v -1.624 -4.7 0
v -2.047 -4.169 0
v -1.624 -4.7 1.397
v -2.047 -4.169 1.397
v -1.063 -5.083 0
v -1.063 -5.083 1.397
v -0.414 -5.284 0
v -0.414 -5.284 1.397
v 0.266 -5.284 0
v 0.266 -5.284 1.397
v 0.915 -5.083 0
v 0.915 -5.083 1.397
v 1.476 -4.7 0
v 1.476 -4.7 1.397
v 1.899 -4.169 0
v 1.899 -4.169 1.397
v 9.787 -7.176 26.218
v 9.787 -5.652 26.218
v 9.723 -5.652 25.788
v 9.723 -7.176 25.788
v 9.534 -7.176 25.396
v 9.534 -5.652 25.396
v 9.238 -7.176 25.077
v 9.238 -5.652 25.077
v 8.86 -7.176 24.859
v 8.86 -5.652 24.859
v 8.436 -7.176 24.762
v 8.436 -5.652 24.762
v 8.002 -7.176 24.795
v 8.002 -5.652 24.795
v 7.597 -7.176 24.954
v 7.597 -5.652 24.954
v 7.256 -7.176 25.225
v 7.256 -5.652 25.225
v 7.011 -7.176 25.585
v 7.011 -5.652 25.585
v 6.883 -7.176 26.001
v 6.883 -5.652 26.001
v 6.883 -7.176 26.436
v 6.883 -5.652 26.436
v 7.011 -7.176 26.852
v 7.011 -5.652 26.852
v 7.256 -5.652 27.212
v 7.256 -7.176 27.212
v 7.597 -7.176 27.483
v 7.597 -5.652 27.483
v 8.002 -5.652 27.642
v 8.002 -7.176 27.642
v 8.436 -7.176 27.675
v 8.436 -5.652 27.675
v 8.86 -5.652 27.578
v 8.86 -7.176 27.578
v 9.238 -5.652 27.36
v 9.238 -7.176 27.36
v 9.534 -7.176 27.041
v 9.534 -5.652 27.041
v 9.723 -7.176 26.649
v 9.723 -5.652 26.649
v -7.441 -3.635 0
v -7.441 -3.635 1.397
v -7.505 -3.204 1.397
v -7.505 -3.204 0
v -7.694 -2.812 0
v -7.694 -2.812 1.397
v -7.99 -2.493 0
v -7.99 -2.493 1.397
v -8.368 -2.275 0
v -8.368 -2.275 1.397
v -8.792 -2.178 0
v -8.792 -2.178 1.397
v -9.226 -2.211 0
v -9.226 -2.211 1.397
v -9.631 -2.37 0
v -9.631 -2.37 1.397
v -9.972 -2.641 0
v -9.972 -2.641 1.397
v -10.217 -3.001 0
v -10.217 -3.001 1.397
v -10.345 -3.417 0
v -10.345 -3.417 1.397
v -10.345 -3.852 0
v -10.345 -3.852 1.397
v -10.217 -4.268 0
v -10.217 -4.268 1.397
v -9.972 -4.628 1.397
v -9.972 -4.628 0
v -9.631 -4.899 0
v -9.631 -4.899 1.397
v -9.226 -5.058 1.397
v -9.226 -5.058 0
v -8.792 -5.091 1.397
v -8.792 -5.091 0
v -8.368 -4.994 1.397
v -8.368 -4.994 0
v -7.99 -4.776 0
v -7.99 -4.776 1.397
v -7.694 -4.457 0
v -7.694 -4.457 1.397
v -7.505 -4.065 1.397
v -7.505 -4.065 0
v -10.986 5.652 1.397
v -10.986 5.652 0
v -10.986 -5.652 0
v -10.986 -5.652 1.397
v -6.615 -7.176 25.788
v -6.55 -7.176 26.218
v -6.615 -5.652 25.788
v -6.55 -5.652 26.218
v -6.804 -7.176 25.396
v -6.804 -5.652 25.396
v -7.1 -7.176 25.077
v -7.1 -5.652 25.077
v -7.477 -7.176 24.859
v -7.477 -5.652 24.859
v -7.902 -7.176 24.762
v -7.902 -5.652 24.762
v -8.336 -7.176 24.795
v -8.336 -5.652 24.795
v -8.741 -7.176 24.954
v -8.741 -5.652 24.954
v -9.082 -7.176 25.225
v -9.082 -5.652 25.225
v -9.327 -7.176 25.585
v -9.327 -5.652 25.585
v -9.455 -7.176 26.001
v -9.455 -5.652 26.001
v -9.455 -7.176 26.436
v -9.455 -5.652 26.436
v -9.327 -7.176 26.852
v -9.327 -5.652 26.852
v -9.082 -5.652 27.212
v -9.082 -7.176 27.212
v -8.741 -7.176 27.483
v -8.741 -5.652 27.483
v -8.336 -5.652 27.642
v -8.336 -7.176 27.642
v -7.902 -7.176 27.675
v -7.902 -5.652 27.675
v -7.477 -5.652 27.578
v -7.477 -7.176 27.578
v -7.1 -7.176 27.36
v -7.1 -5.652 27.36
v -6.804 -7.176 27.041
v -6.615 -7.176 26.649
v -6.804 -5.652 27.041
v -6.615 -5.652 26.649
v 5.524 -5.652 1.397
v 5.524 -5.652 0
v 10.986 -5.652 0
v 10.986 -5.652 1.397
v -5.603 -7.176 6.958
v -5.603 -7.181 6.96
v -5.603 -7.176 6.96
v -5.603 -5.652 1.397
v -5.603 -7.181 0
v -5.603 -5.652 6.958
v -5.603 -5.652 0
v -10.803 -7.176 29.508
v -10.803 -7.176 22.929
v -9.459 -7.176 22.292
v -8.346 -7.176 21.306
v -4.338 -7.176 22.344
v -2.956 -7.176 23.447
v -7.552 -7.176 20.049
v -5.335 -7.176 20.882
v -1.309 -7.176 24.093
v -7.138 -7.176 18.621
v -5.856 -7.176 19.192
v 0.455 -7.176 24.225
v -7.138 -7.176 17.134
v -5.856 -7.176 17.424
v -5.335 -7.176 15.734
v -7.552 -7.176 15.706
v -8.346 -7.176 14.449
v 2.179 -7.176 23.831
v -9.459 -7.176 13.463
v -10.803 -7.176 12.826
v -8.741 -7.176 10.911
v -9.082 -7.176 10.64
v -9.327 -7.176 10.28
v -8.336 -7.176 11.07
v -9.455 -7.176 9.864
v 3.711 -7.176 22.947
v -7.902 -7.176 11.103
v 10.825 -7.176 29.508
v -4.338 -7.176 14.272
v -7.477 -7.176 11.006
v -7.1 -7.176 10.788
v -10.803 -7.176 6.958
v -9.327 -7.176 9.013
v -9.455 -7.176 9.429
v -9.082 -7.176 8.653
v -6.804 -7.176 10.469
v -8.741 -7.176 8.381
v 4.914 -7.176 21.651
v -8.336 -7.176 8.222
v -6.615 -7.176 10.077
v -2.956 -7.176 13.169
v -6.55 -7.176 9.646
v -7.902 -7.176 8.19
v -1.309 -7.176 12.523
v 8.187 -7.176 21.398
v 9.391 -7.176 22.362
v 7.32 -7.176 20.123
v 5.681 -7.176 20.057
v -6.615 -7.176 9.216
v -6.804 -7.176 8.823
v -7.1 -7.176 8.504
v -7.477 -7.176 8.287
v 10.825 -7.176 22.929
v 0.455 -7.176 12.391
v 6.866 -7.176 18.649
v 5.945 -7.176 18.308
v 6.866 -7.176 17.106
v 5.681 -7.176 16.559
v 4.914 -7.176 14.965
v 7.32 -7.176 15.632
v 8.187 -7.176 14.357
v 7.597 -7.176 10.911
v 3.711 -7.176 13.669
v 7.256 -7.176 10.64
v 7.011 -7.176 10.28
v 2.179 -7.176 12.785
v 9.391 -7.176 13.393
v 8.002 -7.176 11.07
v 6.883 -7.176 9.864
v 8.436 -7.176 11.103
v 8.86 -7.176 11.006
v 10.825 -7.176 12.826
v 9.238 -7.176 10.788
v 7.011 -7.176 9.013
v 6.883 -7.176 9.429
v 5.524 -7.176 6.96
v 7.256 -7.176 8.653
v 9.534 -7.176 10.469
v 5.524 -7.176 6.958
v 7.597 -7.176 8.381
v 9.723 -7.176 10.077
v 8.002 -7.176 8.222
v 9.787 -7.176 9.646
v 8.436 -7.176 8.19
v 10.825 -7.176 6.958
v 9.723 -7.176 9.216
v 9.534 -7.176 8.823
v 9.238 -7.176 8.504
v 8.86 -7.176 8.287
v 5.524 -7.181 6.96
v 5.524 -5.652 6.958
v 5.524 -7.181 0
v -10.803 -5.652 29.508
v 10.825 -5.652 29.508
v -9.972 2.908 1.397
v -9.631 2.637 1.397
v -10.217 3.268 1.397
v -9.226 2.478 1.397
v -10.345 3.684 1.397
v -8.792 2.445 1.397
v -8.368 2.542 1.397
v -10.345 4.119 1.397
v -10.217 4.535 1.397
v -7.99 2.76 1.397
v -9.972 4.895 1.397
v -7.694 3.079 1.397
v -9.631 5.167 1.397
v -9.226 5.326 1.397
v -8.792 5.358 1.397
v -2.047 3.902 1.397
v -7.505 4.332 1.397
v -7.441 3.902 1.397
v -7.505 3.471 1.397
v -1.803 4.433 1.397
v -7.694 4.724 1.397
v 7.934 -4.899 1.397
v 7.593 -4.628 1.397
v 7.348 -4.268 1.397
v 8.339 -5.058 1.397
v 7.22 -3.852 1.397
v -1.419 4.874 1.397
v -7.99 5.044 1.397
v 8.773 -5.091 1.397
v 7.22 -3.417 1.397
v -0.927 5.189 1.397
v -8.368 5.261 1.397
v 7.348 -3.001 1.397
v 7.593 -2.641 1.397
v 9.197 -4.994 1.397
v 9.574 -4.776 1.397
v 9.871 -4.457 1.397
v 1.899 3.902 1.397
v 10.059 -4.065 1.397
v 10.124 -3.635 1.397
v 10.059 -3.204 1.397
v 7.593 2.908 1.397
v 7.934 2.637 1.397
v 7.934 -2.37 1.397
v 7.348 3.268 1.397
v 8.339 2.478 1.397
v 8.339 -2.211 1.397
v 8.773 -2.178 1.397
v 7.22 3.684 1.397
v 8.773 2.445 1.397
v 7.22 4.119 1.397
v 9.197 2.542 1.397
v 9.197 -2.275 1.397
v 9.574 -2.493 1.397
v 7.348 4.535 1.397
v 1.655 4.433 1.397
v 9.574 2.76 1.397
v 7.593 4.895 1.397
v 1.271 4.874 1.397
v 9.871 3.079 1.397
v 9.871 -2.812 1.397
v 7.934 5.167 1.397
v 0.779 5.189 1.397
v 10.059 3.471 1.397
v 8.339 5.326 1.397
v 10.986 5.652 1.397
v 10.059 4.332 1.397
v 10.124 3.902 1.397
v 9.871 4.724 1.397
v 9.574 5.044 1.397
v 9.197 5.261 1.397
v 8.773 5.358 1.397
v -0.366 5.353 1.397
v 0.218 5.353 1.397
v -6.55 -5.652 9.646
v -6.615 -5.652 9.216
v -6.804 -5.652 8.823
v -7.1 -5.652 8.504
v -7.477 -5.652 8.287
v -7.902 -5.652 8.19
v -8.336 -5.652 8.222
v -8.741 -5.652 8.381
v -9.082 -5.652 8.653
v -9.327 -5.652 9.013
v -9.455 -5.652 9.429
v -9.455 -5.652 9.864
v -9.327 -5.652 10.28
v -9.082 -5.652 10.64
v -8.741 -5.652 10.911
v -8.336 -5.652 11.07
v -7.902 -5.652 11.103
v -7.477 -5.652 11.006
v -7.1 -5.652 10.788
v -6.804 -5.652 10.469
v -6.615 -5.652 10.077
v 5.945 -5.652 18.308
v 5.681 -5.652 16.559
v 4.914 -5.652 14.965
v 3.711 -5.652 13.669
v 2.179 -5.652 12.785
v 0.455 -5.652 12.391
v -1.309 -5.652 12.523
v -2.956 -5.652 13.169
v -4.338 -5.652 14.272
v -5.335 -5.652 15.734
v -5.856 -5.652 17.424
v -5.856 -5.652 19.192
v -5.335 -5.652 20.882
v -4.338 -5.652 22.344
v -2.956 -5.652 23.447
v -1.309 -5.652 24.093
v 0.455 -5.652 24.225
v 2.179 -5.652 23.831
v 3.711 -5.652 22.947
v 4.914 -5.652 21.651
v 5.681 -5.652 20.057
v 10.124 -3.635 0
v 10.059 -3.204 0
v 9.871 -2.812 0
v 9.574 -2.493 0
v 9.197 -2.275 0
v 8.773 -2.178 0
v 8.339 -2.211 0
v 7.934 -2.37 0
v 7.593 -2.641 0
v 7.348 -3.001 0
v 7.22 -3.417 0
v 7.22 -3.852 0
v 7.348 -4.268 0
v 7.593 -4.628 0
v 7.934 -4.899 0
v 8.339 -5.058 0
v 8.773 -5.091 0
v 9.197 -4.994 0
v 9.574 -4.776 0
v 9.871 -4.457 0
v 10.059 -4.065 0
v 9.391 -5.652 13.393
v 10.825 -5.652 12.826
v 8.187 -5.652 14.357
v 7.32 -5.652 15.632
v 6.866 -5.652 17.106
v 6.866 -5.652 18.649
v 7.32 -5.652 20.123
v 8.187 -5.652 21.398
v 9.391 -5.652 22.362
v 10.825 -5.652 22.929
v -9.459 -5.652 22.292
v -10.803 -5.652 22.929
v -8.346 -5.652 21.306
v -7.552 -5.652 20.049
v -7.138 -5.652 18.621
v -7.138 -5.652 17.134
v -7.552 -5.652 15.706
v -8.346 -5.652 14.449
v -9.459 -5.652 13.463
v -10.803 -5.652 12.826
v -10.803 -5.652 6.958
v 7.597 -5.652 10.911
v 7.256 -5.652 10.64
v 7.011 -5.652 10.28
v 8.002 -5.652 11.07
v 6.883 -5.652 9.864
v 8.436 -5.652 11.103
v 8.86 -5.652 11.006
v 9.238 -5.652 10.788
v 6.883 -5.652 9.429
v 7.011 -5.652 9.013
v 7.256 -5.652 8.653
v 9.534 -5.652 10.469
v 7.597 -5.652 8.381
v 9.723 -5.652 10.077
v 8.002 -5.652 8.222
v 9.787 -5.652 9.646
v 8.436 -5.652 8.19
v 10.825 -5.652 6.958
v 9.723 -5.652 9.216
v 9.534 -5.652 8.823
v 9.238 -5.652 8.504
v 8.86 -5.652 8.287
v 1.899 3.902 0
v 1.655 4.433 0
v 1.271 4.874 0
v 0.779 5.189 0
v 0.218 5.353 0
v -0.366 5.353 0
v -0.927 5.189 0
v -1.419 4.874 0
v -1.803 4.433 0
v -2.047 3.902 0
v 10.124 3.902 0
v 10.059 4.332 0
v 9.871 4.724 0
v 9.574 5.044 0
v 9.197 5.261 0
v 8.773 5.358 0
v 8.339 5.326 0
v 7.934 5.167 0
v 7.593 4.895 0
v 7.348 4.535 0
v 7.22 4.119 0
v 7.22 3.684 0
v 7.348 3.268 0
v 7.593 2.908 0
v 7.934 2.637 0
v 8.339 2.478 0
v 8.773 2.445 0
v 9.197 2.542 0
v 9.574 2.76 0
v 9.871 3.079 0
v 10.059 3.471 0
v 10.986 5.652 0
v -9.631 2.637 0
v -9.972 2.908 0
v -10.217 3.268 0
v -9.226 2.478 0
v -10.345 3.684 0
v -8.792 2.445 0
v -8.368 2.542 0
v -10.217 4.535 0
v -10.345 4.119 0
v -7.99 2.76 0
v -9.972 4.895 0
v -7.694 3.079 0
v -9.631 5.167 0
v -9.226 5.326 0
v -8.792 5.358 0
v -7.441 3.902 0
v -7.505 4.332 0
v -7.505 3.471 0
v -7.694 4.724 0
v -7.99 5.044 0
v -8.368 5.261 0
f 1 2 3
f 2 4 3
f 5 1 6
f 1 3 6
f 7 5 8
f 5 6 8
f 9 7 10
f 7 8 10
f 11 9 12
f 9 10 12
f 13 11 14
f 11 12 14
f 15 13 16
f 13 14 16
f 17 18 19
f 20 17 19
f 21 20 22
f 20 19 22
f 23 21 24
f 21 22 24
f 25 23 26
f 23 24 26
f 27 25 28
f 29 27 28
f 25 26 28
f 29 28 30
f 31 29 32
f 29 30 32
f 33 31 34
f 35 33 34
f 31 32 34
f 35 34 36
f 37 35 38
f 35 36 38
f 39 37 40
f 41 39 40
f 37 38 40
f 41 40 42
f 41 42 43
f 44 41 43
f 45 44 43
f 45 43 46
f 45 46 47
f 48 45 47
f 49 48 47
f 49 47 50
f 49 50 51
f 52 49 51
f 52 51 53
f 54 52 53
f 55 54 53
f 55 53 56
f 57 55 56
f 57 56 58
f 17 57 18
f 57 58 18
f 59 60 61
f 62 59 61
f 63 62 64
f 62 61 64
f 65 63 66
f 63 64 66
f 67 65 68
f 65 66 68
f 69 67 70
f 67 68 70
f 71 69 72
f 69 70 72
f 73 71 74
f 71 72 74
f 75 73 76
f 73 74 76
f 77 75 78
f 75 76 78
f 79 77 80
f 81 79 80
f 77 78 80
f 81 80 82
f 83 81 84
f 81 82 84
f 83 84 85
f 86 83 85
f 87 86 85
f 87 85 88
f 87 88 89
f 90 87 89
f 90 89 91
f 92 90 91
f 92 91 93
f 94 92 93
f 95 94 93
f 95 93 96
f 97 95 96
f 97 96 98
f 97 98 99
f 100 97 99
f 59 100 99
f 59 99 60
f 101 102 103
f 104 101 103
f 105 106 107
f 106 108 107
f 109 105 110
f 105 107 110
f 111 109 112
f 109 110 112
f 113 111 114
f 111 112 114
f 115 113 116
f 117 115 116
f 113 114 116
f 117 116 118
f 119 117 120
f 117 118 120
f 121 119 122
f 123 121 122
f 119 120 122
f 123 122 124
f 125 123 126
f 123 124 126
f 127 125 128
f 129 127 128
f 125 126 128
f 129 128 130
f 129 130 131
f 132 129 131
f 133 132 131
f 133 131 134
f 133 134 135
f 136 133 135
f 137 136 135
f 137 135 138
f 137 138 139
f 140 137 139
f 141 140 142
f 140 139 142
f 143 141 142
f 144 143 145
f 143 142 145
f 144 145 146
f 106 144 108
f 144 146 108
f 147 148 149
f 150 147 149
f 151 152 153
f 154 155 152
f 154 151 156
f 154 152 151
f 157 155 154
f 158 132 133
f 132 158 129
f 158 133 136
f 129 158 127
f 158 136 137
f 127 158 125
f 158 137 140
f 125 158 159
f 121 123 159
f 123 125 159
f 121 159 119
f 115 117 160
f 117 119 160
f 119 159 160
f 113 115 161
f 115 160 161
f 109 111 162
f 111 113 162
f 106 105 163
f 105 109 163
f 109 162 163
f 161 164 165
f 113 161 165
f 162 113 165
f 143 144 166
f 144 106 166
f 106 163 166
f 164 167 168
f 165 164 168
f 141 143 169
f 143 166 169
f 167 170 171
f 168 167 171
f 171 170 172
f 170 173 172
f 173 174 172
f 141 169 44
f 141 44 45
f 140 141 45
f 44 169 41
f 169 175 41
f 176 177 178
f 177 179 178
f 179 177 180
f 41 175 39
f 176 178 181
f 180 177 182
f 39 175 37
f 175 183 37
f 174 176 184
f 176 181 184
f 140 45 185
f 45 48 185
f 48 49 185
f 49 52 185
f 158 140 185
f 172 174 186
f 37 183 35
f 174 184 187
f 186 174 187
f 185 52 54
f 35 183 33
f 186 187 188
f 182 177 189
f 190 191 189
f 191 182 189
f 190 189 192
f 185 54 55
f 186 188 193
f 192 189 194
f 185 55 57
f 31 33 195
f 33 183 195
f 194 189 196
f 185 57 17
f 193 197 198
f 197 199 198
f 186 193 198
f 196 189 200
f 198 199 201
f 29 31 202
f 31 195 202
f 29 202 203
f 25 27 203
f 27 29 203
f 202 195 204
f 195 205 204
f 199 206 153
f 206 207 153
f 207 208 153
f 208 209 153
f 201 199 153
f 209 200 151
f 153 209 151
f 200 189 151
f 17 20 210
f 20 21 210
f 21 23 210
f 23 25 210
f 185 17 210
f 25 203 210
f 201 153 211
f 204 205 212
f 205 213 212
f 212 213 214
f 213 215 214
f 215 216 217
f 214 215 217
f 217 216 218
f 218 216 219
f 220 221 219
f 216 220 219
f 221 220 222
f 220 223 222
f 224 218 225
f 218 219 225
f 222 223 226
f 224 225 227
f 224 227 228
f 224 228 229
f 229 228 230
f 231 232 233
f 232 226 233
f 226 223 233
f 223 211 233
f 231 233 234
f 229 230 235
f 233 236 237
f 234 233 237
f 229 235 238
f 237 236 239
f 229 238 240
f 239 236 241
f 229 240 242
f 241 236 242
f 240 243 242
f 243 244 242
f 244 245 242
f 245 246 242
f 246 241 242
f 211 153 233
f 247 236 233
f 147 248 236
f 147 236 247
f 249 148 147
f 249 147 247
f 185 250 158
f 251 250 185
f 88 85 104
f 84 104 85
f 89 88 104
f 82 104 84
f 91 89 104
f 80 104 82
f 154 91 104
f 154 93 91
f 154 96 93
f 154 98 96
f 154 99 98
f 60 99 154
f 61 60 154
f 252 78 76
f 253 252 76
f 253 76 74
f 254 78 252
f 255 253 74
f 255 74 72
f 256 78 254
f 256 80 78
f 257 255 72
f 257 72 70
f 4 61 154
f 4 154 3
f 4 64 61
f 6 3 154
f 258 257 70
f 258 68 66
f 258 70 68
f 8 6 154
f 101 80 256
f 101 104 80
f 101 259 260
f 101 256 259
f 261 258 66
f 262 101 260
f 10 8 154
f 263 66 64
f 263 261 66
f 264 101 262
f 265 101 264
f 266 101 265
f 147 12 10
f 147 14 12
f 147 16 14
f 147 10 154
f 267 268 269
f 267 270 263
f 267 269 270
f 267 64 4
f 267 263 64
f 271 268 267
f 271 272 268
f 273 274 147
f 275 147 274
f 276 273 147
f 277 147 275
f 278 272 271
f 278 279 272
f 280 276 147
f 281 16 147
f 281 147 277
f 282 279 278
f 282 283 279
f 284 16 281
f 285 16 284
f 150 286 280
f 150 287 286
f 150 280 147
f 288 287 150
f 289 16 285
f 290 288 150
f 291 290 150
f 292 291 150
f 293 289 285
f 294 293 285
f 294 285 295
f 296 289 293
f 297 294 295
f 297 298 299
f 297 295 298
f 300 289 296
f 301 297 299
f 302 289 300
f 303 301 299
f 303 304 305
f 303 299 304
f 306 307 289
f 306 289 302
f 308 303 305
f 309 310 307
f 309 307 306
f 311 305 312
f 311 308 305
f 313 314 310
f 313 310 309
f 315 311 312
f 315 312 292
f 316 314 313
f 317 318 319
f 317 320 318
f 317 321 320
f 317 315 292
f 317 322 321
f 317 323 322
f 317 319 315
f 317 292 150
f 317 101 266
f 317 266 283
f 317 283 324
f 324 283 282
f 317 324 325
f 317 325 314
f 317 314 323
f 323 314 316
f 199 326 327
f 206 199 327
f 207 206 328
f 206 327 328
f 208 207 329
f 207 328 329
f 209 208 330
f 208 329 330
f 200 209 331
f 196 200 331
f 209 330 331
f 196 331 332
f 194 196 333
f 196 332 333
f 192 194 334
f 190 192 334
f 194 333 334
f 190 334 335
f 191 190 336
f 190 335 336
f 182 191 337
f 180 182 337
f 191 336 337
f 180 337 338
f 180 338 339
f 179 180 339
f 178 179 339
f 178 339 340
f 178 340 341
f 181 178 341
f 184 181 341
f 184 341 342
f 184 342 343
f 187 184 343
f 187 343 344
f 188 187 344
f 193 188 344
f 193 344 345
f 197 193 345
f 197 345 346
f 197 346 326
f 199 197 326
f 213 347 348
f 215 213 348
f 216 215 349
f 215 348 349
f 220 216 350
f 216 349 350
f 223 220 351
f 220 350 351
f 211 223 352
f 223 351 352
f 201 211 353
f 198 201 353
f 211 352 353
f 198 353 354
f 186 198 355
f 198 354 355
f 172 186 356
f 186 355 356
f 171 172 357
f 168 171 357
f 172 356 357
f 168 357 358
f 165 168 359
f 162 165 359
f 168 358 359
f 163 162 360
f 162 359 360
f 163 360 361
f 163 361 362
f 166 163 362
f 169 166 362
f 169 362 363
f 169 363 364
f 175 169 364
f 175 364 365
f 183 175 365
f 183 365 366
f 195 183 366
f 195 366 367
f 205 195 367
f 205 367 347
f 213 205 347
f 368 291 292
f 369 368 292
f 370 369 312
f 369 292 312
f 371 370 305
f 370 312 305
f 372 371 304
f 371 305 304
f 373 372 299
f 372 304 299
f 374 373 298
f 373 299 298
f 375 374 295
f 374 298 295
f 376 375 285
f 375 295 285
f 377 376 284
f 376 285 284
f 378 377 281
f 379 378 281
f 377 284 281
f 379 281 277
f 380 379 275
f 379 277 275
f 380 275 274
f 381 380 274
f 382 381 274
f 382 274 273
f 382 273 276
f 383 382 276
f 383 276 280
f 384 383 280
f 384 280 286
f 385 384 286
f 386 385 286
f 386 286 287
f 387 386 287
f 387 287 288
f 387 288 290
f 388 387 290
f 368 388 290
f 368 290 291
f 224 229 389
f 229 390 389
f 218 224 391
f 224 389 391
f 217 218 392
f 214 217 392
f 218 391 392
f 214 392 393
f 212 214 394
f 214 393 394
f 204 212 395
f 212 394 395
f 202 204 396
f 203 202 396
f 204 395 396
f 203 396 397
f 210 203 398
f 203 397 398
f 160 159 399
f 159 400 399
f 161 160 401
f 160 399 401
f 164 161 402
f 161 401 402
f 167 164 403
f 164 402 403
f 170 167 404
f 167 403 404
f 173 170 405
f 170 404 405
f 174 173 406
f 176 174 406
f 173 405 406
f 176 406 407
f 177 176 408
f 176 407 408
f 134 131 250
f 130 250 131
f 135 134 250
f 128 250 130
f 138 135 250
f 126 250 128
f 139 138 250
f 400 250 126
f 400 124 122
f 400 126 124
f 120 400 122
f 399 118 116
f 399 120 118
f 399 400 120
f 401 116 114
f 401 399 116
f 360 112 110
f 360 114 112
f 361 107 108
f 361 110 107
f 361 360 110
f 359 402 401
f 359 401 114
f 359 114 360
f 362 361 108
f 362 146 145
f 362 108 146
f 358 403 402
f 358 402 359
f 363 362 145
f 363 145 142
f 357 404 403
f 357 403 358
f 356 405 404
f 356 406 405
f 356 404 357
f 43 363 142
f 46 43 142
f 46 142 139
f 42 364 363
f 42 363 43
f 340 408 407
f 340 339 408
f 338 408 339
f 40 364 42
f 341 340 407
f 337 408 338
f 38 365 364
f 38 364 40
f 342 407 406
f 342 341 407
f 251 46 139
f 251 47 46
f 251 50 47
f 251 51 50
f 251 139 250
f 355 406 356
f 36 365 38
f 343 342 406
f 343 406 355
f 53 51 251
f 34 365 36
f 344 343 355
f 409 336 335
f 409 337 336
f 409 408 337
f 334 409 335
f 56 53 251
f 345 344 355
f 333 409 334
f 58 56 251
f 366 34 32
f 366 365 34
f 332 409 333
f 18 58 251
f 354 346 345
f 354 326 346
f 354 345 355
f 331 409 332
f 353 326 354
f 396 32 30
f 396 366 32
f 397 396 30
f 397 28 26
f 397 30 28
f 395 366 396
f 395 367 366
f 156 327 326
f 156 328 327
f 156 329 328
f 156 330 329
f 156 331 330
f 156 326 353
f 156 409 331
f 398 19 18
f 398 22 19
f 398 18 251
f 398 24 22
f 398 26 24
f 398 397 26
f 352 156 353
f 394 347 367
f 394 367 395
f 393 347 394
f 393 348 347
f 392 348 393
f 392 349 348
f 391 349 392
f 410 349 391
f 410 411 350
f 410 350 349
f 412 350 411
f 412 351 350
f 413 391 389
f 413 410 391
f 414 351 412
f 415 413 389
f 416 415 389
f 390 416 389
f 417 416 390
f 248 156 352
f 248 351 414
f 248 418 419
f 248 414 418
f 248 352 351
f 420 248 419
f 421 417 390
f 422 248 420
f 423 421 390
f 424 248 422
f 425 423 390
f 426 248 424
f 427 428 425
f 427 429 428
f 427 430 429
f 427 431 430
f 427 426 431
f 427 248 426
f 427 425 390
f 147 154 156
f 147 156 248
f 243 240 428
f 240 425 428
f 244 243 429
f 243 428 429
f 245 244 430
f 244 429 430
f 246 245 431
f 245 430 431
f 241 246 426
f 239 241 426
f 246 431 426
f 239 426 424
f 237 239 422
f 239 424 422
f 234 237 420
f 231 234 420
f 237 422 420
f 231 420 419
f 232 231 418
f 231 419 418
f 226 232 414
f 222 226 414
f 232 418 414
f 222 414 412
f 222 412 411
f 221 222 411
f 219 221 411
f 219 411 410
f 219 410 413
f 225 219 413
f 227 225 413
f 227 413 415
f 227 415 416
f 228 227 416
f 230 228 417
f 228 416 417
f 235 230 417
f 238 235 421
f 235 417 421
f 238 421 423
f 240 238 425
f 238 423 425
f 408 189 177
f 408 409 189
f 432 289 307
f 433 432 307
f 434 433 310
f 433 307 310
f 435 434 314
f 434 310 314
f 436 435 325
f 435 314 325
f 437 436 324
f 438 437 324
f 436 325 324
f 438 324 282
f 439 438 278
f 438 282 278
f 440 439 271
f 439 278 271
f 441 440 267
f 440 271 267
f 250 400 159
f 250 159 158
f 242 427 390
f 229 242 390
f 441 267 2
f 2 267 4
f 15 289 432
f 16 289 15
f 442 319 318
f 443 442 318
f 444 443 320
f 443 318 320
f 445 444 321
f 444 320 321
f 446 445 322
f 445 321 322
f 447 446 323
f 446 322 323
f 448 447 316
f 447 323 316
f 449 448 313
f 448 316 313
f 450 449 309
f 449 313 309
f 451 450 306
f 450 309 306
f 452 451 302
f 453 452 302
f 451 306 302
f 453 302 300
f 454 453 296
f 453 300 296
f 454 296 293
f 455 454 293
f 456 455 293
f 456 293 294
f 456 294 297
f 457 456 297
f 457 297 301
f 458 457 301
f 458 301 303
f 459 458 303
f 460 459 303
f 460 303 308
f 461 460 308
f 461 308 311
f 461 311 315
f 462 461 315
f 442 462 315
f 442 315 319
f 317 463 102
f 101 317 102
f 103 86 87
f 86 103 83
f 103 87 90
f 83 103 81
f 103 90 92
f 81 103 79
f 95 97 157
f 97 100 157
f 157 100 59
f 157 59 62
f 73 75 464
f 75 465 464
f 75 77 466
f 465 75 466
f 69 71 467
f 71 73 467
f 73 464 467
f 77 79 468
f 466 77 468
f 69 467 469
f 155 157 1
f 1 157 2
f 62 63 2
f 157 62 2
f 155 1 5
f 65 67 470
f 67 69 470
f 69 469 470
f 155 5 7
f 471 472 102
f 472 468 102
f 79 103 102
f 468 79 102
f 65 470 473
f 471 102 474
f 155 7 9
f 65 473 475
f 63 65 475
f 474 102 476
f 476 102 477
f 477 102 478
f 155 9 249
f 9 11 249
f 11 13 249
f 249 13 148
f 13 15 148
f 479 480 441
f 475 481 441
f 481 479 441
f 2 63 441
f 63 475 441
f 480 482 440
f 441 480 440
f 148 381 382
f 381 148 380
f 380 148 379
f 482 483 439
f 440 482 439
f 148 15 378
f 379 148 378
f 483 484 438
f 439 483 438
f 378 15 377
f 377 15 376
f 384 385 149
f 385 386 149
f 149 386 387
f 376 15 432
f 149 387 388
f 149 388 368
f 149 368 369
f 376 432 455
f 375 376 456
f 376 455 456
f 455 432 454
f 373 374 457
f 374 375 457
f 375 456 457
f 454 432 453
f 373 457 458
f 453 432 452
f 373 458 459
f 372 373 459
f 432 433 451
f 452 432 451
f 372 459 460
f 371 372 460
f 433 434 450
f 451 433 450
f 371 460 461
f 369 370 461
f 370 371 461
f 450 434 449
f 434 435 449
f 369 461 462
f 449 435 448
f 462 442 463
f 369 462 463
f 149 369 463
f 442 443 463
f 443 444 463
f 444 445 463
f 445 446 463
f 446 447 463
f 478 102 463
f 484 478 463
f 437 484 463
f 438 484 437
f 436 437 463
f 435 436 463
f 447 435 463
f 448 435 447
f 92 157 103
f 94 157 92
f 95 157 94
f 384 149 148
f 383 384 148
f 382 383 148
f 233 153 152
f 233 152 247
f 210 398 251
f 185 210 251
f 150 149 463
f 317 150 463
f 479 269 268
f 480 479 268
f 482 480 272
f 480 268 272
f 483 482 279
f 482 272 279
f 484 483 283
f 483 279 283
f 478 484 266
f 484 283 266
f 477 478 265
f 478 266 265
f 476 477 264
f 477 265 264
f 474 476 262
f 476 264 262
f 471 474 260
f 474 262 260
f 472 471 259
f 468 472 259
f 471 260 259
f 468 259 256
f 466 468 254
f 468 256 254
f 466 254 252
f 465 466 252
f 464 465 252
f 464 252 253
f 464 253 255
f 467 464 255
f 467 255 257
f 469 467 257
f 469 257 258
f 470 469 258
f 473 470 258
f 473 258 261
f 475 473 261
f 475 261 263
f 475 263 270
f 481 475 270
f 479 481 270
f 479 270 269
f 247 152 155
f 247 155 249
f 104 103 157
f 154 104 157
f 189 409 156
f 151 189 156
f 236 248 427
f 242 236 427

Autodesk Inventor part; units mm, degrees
ref_plane "YZ Plane" through (0, 0, 0) normal (1, 0, 0) x (0, 1, 0)
ref_plane "XZ Plane" through (0, 0, 0) normal (0, 1, 0) x (-1, 0, 0)
ref_plane "XY Plane" through (0, 0, 0) normal (0, 0, 1) x (1, 0, 0)
sketch "Sketch1" plane through (0, 0, 0) normal (0, 0, 1) x (1, 0, 0)
  line L0 (-10.9855, -5.6515) -> (10.9855, -5.6515)
  line L1 (10.9855, -5.6515) -> (10.9855, 5.6515)
  line L2 (10.9855, 5.6515) -> (-10.9855, 5.6515)
  line L3 (-10.9855, 5.6515) -> (-10.9855, -5.6515)
  line L4 (-10.9855, -5.6515) -> (10.9855, 5.6515) construction
  line L5 (10.9855, -5.6515) -> (-10.9855, 5.6515) construction
  point P0 (0, 0)
extrude "Extrusion1" add sketch "Sketch1" along normal blind 1.397
sketch "Sketch2" plane through (0, 0, 1.397) normal (0, 0, 1) x (1, 0, 0)
  circle A0 centre (-8.9011, 3.9017) radius 1.4605
  circle A1 centre (-8.9011, -3.6346) radius 1.4605
  circle A2 centre (8.6638, -3.6346) radius 1.4605
  circle A3 centre (8.6638, 3.9017) radius 1.4605
  line L0 (-2.0473, 3.9017) -> (-2.0473, -4.1687)
  line L1 (1.8989, 3.9017) -> (1.8989, -4.1687)
  arc A4 (1.8989, 3.9017) -> (-2.0473, 3.9017) centre (-0.0742, 3.3161) ccw
  arc A5 (-2.0473, -4.1687) -> (1.8989, -4.1687) centre (-0.0742, -3.0327) ccw
  point P0 (0, 0)
extrude "Extrusion2" cut sketch "Sketch2" against normal blind 25.4
sketch "Sketch3" plane through (0, 0, 0) normal (0, 1, 0) x (-1, 0, 0)
  point P0 (0, 0)
sketch "Sketch4" plane through (0, 0, 1.397) normal (0, 0, 1) x (1, 0, 0)
  line L0 (-2.0473, -4.1687) -> (-5.6033, -4.1687)
  line L1 (1.9681, -4.1687) -> (5.5241, -4.1687)
  line L2 (-10.9855, -5.6515) -> (10.9855, -5.6515) projected
  line L3 (-5.6033, -5.6515) -> (5.5241, -5.6515)
  line L4 (5.5241, -5.6515) -> (5.5241, -7.4092)
  line L5 (5.5241, -7.4092) -> (-5.6033, -7.4092)
  line L6 (-5.6033, -7.4092) -> (-5.6033, -5.6515)
  point P0 (0, 0)
  dimension "d11" = 3.556
  dimension "d12" = 3.556
extrude "Extrusion3" add sketch "Sketch4" along normal blind 5.5626 and the other way blind 1.397
sketch "Sketch6" plane through (-5.6033, -5.6515, 1.397) normal (0, 1, 0) x (1, 0, 0)
  line L0 (-5.1994, -5.5615) -> (-5.1994, -11.4289)
  line L1 (16.4285, -5.5615) -> (16.4285, -11.4289)
  arc A0 (-5.1994, -21.5321) -> (-5.1994, -11.4289) centre (-6.7732, -16.4805) ccw
  arc A1 (16.4285, -11.4289) -> (16.4285, -21.5321) centre (17.5971, -16.4805) ccw
  line L2 (16.4285, -21.5321) -> (16.4285, -28.1107)
  line L3 (-5.1994, -21.5321) -> (-5.1994, -28.1107)
  line L4 (-5.1994, -28.1107) -> (16.4285, -28.1107)
  circle A2 centre (5.6145, -16.911) radius 5.9336
  circle A3 centre (-2.4076, -8.2492) radius 1.4605
  circle A4 centre (13.9302, -8.2492) radius 1.4605
  circle A5 centre (-2.4076, -24.8214) radius 1.4605
  circle A6 centre (13.9302, -24.8214) radius 1.4605
  line L5 (-5.1994, -5.5615) -> (16.4285, -5.5615)
  point P0 (5.6033, 1.397)
  dimension "d20" = 2.921
  dimension "d21" = 2.921
  dimension "d22" = 2.921
  dimension "d23" = 2.921
extrude "Extrusion4" add sketch "Sketch6" against normal blind 1.524
sketch "Sketch8" plane through (-5.6033, -7.4092, 6.9596) normal (0, -1, 0) x (1, 0, 0)
  line L0 (11.1274, -5.5626) -> (11.1274, -6.9596) projected
  line L1 (0, 0) -> (0, -6.9596) projected
  line L2 (11.1274, -6.9596) -> (0, -6.9596)
  line L3 (0, -6.9596) -> (0, 0)
  line L4 (0, 0) -> (11.1274, 0)
  line L5 (11.1274, 0) -> (11.1274, -6.9596)
  point P0 (5.6033, -6.9596)
extrude "Extrusion5" cut sketch "Sketch8" against normal blind 0.2286
properties part number "motor mount"
